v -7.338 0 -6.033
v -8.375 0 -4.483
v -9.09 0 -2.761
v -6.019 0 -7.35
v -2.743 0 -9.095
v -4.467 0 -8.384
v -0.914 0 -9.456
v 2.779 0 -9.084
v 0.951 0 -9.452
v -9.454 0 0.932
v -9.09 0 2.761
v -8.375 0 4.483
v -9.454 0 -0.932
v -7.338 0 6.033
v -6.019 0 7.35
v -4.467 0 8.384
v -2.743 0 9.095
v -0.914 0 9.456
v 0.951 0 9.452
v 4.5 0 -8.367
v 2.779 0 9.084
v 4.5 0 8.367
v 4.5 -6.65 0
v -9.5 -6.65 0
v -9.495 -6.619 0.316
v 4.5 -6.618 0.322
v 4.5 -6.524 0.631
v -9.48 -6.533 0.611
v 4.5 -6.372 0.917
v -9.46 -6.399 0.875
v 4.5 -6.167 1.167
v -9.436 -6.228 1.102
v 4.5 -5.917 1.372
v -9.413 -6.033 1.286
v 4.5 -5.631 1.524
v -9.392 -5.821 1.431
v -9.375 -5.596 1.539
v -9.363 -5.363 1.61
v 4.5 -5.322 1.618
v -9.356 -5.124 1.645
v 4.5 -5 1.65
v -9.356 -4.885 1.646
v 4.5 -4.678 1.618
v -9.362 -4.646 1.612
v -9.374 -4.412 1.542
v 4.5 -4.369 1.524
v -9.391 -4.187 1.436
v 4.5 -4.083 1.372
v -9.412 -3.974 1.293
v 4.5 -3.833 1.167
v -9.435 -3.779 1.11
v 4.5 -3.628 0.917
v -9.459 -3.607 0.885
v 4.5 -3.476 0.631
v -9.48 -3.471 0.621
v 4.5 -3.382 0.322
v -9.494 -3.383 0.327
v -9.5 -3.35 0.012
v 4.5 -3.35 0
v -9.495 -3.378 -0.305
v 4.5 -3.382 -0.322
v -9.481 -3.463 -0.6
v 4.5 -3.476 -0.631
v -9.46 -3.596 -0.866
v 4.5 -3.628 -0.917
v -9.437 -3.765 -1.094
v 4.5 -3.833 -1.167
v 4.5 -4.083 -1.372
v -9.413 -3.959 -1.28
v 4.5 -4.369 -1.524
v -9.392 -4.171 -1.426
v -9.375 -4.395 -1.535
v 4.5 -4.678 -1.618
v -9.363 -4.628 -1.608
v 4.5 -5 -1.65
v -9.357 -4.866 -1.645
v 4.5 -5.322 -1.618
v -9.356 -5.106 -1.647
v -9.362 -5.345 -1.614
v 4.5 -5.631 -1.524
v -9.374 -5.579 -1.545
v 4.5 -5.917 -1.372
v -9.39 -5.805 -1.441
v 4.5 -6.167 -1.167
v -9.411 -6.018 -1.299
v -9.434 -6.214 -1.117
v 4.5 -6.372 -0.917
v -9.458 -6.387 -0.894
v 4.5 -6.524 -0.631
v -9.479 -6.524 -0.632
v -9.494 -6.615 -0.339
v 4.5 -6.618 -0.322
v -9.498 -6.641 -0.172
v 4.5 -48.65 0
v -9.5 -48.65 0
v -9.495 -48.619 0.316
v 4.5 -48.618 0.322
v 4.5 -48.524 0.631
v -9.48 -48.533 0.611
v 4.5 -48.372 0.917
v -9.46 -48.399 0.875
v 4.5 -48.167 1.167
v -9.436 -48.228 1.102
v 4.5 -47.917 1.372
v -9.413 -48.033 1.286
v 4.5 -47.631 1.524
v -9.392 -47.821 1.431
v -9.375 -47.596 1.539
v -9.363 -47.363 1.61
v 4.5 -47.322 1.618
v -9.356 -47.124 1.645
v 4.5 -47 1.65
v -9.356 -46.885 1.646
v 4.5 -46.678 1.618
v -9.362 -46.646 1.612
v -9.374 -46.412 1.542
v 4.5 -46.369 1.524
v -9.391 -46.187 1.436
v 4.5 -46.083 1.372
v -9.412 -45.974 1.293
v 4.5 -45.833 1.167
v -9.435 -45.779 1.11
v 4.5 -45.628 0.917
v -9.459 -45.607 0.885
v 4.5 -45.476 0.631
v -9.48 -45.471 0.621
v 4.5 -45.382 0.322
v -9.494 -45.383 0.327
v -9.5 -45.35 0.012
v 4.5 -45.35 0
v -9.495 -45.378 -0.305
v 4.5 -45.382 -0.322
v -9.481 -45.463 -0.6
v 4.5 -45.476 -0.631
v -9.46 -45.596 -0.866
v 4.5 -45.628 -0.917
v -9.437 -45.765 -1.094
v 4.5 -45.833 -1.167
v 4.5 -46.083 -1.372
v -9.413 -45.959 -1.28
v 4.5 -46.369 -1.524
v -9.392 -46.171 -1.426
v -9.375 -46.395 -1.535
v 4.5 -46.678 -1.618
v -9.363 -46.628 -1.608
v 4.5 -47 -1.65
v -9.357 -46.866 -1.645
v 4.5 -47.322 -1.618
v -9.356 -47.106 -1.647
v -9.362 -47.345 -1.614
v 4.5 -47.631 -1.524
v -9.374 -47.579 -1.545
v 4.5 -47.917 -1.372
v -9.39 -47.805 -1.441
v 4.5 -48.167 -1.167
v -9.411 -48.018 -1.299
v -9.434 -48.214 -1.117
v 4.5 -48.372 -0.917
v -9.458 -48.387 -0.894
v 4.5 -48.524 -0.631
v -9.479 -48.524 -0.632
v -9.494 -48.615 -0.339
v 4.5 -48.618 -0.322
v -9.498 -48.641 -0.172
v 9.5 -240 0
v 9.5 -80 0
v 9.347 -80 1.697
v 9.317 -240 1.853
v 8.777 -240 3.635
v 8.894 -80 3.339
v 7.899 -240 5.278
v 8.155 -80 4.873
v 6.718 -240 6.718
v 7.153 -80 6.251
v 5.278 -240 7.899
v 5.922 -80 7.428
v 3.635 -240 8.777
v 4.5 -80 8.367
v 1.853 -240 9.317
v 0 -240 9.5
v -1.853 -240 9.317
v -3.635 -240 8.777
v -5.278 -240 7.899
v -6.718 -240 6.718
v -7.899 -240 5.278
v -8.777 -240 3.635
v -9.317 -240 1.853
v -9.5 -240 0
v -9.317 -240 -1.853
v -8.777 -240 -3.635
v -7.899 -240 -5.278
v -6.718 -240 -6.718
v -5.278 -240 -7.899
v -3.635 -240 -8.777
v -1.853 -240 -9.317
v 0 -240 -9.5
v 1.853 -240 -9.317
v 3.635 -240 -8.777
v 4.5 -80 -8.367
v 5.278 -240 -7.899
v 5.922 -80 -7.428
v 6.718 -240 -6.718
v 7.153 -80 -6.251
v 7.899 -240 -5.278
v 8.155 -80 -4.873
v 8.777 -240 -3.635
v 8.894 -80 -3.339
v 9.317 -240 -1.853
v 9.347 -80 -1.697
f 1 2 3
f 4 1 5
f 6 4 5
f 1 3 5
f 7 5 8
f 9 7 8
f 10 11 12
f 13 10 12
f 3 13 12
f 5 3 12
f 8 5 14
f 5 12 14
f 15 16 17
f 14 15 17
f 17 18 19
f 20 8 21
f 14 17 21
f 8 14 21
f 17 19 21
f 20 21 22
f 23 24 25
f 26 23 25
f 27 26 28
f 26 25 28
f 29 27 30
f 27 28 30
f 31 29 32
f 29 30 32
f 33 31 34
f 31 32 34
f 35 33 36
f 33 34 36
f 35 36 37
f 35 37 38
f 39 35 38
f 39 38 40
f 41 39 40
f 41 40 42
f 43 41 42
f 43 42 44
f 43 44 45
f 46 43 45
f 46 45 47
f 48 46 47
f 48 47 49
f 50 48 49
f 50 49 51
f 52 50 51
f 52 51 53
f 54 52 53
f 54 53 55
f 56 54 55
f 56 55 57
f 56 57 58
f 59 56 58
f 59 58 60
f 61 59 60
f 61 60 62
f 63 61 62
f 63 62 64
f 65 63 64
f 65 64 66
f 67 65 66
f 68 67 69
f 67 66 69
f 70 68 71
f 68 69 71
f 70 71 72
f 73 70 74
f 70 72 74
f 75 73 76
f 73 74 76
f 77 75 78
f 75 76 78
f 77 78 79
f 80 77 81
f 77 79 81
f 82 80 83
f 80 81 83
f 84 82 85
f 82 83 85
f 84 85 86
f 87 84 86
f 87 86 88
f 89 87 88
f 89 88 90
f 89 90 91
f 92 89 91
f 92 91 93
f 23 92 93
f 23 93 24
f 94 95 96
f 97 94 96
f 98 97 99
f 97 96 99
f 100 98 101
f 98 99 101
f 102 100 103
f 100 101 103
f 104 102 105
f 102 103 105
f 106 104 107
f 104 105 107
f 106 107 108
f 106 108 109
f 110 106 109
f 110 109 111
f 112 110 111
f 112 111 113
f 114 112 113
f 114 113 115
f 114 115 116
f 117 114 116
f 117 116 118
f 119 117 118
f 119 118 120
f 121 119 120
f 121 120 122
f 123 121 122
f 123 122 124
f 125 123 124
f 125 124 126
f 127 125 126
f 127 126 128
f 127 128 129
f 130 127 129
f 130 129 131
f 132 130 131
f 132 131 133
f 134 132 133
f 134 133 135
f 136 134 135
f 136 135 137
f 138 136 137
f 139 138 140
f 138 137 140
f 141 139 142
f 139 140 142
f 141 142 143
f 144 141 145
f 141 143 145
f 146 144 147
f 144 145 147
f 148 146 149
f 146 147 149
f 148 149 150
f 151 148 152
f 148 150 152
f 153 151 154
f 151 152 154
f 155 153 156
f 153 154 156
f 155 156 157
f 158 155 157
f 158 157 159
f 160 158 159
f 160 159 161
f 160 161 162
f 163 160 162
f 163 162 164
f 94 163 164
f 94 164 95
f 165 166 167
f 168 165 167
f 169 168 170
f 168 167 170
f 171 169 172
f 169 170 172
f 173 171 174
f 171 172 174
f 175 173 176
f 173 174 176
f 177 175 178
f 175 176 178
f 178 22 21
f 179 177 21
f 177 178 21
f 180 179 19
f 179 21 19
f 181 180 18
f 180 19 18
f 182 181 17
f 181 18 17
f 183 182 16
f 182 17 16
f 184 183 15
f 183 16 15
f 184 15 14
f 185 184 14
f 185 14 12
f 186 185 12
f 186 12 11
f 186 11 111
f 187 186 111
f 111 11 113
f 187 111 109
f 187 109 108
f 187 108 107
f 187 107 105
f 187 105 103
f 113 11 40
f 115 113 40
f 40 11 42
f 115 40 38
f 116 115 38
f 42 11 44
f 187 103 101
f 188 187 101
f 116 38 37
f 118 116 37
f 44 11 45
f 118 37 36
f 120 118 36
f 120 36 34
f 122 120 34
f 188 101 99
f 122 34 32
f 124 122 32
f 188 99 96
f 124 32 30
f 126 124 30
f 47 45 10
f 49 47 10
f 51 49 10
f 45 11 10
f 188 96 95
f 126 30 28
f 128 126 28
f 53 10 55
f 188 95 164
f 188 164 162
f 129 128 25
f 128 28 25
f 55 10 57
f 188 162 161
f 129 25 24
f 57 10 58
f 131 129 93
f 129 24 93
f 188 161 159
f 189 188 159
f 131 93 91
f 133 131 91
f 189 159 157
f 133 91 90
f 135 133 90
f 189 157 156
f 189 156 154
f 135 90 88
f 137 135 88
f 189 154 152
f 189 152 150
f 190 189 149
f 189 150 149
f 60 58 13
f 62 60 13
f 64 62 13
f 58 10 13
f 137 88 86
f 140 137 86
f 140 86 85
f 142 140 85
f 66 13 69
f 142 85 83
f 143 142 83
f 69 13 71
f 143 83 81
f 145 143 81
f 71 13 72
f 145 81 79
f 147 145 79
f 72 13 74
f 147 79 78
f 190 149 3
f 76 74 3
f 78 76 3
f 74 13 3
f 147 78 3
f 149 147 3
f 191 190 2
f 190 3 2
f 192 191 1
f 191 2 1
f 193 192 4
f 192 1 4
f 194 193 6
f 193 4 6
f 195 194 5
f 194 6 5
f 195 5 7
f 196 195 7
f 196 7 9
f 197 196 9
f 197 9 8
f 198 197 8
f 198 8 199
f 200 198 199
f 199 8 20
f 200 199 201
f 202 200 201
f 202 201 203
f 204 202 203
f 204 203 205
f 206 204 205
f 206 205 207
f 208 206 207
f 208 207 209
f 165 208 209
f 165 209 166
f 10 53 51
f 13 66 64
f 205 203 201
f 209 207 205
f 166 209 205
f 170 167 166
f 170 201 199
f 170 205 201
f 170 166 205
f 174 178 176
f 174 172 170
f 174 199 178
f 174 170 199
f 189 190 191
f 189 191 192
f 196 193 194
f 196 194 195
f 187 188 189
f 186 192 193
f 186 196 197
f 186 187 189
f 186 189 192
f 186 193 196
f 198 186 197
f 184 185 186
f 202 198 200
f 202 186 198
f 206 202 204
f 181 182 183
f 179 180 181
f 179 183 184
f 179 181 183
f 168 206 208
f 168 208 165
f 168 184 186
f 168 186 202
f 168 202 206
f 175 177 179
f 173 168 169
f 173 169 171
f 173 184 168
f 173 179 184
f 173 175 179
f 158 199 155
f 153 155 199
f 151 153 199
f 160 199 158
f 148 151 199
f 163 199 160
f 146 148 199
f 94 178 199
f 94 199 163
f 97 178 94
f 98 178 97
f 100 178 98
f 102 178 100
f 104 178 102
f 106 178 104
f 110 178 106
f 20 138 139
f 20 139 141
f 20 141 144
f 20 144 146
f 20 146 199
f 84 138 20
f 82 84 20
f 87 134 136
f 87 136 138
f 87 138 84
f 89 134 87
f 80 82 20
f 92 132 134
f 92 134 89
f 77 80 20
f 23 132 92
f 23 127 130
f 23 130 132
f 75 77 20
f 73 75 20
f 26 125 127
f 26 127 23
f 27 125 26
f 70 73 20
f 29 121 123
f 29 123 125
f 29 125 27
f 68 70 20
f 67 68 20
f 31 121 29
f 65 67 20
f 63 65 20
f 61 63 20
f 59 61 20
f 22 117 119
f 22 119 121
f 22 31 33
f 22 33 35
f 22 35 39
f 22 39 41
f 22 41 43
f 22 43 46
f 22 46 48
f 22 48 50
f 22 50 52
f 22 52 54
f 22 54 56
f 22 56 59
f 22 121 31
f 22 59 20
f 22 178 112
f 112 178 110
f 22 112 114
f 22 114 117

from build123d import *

# Parameters (mm, degrees)
F0_R     = 9.5
F1_DEPTH = 240
F3_W     = 80
F3_H     = 45.5118790269
F4_DEPTH = 5
F6_D     = 3.3


with BuildPart() as f1:
    # F0 (on Front) → F1 (new body)
    with BuildSketch(Plane.XZ):
        Circle(F0_R)
    extrude(amount=F1_DEPTH)

    # F3 (on offset) → F4 (cut)
    with BuildSketch(Plane.YZ.offset(9.5)):
        with Locations((-40, 0.18652156)):
            Rectangle(F3_W, F3_H)
    extrude(amount=-F4_DEPTH, mode=Mode.SUBTRACT)

    # F6 (through all)
    with Locations(Plane.YZ.offset(4.5)):
        with Locations((-47, 0), (-5, 0)):
            Hole(F6_D / 2)


solid = f1.part
